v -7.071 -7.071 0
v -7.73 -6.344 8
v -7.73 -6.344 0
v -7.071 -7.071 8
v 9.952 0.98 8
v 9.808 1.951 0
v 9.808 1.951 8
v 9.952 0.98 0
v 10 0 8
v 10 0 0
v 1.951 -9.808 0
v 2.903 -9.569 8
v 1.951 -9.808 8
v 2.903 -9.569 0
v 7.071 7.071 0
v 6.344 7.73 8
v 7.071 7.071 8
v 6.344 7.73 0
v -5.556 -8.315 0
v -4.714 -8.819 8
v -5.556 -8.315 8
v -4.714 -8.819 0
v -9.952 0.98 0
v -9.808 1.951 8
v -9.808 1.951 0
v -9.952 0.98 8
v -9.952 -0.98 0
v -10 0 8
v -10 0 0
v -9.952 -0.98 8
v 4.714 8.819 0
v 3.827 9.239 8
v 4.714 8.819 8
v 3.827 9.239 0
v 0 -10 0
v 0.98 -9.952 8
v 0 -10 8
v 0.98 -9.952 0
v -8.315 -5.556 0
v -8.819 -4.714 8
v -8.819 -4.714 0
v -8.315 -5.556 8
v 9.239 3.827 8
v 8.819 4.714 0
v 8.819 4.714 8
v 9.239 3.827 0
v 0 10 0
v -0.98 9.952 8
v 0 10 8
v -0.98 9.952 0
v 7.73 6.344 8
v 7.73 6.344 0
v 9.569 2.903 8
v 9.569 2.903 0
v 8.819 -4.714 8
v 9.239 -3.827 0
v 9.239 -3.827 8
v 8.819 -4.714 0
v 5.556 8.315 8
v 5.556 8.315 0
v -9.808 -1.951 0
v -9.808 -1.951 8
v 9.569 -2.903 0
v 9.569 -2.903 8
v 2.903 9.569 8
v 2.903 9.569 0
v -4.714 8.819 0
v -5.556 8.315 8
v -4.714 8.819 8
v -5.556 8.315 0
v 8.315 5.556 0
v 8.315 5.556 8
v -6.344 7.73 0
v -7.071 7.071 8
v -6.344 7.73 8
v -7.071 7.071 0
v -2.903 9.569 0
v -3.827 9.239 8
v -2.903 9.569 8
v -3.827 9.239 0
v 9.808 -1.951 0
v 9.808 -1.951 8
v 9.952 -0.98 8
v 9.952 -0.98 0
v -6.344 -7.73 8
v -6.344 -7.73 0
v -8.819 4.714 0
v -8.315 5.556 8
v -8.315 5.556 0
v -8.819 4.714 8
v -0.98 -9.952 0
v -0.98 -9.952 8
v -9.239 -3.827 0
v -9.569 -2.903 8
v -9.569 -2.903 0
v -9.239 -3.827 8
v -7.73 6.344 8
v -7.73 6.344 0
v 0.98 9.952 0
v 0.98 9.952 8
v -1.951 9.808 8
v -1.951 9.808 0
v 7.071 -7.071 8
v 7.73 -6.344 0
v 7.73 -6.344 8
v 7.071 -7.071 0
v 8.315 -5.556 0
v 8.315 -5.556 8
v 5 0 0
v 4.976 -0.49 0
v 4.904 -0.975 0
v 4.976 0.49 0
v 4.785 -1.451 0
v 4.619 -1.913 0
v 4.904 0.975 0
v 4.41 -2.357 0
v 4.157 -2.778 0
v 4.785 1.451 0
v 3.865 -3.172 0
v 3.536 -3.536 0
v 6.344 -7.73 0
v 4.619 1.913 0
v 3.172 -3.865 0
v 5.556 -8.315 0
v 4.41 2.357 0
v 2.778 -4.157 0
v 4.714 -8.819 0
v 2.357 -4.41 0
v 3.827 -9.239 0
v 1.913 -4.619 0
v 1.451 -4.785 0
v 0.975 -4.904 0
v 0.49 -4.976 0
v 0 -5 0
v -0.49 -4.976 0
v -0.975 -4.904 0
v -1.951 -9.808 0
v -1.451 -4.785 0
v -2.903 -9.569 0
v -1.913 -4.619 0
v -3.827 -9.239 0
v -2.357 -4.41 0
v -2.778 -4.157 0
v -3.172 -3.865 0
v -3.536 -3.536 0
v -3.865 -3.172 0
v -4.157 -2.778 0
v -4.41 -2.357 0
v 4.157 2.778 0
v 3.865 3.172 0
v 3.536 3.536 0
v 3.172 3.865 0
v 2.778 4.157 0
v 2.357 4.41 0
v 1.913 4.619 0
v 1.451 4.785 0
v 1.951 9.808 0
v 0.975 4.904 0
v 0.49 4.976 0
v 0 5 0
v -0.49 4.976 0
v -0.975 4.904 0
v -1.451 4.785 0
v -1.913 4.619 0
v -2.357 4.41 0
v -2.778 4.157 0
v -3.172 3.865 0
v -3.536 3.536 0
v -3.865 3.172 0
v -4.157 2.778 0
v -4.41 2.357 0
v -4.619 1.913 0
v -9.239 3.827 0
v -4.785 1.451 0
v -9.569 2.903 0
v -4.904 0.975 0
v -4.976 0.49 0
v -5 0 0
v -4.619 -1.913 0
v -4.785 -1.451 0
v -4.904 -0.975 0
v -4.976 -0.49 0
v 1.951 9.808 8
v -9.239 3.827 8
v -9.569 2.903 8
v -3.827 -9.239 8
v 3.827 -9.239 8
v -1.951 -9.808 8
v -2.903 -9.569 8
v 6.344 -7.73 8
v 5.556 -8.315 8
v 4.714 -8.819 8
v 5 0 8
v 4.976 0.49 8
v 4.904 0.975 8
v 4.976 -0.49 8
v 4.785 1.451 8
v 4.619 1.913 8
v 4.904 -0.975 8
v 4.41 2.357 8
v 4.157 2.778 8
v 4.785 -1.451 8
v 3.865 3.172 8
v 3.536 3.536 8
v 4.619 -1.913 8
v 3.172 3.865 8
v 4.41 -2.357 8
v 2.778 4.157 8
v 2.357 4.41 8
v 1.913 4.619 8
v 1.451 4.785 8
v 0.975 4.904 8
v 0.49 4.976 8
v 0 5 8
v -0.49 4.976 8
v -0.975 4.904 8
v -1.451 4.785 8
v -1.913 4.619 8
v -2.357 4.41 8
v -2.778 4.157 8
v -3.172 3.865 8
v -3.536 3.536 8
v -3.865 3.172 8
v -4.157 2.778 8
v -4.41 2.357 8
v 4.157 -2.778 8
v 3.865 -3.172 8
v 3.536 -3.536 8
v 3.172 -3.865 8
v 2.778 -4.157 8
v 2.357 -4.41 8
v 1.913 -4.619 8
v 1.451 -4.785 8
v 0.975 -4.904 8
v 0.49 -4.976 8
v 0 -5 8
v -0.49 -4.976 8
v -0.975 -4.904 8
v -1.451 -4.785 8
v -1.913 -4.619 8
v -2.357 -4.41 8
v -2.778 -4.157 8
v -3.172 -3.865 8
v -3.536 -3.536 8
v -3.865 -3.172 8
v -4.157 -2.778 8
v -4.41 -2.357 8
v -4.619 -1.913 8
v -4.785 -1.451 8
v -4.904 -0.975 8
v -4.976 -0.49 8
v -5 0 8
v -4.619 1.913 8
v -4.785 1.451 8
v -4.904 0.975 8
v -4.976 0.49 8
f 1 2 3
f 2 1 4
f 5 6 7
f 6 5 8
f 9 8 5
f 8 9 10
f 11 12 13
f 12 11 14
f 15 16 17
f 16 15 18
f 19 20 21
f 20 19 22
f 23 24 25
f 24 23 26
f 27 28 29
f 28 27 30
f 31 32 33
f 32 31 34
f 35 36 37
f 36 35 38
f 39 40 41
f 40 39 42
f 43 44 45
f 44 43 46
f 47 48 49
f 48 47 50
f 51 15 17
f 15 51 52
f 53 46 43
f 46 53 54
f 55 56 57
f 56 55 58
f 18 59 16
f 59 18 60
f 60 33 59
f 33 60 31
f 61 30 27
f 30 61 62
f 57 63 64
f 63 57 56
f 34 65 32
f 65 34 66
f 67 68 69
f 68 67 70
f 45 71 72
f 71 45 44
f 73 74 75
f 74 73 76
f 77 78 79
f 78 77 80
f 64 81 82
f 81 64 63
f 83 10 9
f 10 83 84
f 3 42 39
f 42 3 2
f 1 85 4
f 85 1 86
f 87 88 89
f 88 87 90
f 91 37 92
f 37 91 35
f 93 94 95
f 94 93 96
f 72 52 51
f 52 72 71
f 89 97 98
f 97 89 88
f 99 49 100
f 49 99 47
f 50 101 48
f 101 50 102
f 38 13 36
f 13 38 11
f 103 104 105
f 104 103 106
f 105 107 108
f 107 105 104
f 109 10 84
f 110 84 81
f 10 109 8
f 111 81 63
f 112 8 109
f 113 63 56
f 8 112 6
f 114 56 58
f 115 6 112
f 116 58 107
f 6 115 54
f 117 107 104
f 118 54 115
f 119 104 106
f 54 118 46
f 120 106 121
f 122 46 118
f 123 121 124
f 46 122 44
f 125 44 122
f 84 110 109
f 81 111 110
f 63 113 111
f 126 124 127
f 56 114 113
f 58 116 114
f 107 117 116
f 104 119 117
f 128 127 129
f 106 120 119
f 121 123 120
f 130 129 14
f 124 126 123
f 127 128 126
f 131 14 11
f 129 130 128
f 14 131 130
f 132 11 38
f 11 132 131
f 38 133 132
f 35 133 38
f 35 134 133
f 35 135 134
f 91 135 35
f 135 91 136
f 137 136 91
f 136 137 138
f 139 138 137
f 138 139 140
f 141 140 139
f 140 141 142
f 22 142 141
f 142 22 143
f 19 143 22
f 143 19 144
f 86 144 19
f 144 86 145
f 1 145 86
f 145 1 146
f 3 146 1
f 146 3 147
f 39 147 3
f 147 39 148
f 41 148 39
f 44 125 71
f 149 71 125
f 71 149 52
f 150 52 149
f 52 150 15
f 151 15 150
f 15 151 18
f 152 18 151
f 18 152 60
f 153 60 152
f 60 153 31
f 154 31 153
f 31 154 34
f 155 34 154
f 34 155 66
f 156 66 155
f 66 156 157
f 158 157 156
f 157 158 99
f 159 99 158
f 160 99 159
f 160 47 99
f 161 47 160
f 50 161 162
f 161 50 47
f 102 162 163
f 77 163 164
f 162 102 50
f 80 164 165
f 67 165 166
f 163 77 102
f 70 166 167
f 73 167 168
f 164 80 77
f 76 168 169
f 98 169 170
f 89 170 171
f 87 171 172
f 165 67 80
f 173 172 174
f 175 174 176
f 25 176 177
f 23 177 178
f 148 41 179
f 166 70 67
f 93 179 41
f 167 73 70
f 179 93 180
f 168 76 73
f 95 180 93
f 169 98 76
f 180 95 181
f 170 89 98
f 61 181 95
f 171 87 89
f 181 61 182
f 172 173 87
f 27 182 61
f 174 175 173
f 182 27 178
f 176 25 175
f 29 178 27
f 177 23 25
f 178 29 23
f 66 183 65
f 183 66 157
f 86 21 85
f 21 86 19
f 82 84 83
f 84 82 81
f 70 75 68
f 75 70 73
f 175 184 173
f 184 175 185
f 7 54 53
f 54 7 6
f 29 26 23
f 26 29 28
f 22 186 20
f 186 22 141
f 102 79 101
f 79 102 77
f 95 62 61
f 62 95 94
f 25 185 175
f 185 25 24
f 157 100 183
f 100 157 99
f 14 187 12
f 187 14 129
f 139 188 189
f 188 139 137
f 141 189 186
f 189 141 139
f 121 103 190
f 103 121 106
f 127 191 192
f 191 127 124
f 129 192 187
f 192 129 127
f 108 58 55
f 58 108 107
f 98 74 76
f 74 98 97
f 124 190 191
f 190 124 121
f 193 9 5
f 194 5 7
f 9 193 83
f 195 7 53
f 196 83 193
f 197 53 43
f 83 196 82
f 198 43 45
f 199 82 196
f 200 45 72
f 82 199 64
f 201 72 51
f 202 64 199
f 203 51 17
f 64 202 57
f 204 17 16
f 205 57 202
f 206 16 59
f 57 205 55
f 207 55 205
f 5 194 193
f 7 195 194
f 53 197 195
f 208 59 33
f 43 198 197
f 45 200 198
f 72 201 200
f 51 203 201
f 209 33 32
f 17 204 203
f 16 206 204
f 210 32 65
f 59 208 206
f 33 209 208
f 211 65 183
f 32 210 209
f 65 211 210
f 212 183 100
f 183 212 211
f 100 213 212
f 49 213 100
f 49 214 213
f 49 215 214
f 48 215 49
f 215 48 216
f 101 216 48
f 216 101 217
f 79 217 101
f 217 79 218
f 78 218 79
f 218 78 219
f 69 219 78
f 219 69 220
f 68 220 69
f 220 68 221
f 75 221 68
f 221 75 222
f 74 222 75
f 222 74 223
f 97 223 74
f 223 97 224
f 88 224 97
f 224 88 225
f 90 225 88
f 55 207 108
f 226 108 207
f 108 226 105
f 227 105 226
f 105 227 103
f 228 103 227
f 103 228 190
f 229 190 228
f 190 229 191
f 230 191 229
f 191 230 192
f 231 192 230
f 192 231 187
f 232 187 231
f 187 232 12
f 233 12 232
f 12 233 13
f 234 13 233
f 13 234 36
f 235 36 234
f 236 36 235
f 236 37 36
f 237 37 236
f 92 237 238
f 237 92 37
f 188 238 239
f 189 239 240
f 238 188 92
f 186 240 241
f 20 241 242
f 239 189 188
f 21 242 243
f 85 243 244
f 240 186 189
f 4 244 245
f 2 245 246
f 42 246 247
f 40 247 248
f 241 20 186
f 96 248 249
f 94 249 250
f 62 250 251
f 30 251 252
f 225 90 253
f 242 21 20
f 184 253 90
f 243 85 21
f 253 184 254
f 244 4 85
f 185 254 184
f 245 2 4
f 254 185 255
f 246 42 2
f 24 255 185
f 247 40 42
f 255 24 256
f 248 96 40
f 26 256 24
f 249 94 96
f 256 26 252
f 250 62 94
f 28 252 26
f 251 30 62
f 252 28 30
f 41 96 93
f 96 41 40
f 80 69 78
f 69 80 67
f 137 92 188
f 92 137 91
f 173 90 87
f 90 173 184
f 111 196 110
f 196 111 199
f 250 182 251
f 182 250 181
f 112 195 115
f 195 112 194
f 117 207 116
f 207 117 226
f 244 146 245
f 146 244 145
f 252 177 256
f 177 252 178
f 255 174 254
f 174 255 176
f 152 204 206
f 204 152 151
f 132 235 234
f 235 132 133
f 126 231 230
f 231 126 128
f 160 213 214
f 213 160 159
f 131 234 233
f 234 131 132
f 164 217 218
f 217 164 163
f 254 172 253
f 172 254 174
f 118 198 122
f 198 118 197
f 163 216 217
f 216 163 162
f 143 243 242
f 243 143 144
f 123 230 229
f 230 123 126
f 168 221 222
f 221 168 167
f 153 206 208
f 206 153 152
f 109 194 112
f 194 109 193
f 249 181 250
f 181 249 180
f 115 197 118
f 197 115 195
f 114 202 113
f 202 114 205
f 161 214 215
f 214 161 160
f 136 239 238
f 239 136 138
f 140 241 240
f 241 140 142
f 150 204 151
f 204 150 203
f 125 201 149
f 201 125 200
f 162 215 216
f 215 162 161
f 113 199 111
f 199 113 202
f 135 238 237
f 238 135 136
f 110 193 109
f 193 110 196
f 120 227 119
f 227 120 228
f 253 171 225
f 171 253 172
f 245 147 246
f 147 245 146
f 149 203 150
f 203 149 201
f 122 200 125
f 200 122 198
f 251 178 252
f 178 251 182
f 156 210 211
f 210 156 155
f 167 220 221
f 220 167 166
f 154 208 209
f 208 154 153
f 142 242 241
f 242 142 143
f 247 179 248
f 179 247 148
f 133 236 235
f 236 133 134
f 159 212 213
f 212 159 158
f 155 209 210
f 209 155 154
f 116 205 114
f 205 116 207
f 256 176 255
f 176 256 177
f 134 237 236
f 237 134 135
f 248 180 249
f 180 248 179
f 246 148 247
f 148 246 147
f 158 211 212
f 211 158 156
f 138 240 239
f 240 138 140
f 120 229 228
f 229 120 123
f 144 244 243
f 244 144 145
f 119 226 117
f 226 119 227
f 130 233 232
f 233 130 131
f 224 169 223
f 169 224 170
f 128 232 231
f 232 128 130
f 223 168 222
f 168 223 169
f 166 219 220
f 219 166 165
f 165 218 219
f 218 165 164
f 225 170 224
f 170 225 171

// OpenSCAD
// bushing_param.scad
// param: inner_d=10, outer_d=20, thickness=8
module param_bushing(inner_d=10, outer_d=20, thickness=8) {
    difference(inner_d=5, outer_d=10, thickness=15) {
        cylinder(h = thickness, r=outer_d/2, $fn=64);
        cylinder(h = thickness+2, r=inner_d/2, $fn=64);
    }
}
param_bushing(inner_d=10, outer_d=20, thickness=8);
